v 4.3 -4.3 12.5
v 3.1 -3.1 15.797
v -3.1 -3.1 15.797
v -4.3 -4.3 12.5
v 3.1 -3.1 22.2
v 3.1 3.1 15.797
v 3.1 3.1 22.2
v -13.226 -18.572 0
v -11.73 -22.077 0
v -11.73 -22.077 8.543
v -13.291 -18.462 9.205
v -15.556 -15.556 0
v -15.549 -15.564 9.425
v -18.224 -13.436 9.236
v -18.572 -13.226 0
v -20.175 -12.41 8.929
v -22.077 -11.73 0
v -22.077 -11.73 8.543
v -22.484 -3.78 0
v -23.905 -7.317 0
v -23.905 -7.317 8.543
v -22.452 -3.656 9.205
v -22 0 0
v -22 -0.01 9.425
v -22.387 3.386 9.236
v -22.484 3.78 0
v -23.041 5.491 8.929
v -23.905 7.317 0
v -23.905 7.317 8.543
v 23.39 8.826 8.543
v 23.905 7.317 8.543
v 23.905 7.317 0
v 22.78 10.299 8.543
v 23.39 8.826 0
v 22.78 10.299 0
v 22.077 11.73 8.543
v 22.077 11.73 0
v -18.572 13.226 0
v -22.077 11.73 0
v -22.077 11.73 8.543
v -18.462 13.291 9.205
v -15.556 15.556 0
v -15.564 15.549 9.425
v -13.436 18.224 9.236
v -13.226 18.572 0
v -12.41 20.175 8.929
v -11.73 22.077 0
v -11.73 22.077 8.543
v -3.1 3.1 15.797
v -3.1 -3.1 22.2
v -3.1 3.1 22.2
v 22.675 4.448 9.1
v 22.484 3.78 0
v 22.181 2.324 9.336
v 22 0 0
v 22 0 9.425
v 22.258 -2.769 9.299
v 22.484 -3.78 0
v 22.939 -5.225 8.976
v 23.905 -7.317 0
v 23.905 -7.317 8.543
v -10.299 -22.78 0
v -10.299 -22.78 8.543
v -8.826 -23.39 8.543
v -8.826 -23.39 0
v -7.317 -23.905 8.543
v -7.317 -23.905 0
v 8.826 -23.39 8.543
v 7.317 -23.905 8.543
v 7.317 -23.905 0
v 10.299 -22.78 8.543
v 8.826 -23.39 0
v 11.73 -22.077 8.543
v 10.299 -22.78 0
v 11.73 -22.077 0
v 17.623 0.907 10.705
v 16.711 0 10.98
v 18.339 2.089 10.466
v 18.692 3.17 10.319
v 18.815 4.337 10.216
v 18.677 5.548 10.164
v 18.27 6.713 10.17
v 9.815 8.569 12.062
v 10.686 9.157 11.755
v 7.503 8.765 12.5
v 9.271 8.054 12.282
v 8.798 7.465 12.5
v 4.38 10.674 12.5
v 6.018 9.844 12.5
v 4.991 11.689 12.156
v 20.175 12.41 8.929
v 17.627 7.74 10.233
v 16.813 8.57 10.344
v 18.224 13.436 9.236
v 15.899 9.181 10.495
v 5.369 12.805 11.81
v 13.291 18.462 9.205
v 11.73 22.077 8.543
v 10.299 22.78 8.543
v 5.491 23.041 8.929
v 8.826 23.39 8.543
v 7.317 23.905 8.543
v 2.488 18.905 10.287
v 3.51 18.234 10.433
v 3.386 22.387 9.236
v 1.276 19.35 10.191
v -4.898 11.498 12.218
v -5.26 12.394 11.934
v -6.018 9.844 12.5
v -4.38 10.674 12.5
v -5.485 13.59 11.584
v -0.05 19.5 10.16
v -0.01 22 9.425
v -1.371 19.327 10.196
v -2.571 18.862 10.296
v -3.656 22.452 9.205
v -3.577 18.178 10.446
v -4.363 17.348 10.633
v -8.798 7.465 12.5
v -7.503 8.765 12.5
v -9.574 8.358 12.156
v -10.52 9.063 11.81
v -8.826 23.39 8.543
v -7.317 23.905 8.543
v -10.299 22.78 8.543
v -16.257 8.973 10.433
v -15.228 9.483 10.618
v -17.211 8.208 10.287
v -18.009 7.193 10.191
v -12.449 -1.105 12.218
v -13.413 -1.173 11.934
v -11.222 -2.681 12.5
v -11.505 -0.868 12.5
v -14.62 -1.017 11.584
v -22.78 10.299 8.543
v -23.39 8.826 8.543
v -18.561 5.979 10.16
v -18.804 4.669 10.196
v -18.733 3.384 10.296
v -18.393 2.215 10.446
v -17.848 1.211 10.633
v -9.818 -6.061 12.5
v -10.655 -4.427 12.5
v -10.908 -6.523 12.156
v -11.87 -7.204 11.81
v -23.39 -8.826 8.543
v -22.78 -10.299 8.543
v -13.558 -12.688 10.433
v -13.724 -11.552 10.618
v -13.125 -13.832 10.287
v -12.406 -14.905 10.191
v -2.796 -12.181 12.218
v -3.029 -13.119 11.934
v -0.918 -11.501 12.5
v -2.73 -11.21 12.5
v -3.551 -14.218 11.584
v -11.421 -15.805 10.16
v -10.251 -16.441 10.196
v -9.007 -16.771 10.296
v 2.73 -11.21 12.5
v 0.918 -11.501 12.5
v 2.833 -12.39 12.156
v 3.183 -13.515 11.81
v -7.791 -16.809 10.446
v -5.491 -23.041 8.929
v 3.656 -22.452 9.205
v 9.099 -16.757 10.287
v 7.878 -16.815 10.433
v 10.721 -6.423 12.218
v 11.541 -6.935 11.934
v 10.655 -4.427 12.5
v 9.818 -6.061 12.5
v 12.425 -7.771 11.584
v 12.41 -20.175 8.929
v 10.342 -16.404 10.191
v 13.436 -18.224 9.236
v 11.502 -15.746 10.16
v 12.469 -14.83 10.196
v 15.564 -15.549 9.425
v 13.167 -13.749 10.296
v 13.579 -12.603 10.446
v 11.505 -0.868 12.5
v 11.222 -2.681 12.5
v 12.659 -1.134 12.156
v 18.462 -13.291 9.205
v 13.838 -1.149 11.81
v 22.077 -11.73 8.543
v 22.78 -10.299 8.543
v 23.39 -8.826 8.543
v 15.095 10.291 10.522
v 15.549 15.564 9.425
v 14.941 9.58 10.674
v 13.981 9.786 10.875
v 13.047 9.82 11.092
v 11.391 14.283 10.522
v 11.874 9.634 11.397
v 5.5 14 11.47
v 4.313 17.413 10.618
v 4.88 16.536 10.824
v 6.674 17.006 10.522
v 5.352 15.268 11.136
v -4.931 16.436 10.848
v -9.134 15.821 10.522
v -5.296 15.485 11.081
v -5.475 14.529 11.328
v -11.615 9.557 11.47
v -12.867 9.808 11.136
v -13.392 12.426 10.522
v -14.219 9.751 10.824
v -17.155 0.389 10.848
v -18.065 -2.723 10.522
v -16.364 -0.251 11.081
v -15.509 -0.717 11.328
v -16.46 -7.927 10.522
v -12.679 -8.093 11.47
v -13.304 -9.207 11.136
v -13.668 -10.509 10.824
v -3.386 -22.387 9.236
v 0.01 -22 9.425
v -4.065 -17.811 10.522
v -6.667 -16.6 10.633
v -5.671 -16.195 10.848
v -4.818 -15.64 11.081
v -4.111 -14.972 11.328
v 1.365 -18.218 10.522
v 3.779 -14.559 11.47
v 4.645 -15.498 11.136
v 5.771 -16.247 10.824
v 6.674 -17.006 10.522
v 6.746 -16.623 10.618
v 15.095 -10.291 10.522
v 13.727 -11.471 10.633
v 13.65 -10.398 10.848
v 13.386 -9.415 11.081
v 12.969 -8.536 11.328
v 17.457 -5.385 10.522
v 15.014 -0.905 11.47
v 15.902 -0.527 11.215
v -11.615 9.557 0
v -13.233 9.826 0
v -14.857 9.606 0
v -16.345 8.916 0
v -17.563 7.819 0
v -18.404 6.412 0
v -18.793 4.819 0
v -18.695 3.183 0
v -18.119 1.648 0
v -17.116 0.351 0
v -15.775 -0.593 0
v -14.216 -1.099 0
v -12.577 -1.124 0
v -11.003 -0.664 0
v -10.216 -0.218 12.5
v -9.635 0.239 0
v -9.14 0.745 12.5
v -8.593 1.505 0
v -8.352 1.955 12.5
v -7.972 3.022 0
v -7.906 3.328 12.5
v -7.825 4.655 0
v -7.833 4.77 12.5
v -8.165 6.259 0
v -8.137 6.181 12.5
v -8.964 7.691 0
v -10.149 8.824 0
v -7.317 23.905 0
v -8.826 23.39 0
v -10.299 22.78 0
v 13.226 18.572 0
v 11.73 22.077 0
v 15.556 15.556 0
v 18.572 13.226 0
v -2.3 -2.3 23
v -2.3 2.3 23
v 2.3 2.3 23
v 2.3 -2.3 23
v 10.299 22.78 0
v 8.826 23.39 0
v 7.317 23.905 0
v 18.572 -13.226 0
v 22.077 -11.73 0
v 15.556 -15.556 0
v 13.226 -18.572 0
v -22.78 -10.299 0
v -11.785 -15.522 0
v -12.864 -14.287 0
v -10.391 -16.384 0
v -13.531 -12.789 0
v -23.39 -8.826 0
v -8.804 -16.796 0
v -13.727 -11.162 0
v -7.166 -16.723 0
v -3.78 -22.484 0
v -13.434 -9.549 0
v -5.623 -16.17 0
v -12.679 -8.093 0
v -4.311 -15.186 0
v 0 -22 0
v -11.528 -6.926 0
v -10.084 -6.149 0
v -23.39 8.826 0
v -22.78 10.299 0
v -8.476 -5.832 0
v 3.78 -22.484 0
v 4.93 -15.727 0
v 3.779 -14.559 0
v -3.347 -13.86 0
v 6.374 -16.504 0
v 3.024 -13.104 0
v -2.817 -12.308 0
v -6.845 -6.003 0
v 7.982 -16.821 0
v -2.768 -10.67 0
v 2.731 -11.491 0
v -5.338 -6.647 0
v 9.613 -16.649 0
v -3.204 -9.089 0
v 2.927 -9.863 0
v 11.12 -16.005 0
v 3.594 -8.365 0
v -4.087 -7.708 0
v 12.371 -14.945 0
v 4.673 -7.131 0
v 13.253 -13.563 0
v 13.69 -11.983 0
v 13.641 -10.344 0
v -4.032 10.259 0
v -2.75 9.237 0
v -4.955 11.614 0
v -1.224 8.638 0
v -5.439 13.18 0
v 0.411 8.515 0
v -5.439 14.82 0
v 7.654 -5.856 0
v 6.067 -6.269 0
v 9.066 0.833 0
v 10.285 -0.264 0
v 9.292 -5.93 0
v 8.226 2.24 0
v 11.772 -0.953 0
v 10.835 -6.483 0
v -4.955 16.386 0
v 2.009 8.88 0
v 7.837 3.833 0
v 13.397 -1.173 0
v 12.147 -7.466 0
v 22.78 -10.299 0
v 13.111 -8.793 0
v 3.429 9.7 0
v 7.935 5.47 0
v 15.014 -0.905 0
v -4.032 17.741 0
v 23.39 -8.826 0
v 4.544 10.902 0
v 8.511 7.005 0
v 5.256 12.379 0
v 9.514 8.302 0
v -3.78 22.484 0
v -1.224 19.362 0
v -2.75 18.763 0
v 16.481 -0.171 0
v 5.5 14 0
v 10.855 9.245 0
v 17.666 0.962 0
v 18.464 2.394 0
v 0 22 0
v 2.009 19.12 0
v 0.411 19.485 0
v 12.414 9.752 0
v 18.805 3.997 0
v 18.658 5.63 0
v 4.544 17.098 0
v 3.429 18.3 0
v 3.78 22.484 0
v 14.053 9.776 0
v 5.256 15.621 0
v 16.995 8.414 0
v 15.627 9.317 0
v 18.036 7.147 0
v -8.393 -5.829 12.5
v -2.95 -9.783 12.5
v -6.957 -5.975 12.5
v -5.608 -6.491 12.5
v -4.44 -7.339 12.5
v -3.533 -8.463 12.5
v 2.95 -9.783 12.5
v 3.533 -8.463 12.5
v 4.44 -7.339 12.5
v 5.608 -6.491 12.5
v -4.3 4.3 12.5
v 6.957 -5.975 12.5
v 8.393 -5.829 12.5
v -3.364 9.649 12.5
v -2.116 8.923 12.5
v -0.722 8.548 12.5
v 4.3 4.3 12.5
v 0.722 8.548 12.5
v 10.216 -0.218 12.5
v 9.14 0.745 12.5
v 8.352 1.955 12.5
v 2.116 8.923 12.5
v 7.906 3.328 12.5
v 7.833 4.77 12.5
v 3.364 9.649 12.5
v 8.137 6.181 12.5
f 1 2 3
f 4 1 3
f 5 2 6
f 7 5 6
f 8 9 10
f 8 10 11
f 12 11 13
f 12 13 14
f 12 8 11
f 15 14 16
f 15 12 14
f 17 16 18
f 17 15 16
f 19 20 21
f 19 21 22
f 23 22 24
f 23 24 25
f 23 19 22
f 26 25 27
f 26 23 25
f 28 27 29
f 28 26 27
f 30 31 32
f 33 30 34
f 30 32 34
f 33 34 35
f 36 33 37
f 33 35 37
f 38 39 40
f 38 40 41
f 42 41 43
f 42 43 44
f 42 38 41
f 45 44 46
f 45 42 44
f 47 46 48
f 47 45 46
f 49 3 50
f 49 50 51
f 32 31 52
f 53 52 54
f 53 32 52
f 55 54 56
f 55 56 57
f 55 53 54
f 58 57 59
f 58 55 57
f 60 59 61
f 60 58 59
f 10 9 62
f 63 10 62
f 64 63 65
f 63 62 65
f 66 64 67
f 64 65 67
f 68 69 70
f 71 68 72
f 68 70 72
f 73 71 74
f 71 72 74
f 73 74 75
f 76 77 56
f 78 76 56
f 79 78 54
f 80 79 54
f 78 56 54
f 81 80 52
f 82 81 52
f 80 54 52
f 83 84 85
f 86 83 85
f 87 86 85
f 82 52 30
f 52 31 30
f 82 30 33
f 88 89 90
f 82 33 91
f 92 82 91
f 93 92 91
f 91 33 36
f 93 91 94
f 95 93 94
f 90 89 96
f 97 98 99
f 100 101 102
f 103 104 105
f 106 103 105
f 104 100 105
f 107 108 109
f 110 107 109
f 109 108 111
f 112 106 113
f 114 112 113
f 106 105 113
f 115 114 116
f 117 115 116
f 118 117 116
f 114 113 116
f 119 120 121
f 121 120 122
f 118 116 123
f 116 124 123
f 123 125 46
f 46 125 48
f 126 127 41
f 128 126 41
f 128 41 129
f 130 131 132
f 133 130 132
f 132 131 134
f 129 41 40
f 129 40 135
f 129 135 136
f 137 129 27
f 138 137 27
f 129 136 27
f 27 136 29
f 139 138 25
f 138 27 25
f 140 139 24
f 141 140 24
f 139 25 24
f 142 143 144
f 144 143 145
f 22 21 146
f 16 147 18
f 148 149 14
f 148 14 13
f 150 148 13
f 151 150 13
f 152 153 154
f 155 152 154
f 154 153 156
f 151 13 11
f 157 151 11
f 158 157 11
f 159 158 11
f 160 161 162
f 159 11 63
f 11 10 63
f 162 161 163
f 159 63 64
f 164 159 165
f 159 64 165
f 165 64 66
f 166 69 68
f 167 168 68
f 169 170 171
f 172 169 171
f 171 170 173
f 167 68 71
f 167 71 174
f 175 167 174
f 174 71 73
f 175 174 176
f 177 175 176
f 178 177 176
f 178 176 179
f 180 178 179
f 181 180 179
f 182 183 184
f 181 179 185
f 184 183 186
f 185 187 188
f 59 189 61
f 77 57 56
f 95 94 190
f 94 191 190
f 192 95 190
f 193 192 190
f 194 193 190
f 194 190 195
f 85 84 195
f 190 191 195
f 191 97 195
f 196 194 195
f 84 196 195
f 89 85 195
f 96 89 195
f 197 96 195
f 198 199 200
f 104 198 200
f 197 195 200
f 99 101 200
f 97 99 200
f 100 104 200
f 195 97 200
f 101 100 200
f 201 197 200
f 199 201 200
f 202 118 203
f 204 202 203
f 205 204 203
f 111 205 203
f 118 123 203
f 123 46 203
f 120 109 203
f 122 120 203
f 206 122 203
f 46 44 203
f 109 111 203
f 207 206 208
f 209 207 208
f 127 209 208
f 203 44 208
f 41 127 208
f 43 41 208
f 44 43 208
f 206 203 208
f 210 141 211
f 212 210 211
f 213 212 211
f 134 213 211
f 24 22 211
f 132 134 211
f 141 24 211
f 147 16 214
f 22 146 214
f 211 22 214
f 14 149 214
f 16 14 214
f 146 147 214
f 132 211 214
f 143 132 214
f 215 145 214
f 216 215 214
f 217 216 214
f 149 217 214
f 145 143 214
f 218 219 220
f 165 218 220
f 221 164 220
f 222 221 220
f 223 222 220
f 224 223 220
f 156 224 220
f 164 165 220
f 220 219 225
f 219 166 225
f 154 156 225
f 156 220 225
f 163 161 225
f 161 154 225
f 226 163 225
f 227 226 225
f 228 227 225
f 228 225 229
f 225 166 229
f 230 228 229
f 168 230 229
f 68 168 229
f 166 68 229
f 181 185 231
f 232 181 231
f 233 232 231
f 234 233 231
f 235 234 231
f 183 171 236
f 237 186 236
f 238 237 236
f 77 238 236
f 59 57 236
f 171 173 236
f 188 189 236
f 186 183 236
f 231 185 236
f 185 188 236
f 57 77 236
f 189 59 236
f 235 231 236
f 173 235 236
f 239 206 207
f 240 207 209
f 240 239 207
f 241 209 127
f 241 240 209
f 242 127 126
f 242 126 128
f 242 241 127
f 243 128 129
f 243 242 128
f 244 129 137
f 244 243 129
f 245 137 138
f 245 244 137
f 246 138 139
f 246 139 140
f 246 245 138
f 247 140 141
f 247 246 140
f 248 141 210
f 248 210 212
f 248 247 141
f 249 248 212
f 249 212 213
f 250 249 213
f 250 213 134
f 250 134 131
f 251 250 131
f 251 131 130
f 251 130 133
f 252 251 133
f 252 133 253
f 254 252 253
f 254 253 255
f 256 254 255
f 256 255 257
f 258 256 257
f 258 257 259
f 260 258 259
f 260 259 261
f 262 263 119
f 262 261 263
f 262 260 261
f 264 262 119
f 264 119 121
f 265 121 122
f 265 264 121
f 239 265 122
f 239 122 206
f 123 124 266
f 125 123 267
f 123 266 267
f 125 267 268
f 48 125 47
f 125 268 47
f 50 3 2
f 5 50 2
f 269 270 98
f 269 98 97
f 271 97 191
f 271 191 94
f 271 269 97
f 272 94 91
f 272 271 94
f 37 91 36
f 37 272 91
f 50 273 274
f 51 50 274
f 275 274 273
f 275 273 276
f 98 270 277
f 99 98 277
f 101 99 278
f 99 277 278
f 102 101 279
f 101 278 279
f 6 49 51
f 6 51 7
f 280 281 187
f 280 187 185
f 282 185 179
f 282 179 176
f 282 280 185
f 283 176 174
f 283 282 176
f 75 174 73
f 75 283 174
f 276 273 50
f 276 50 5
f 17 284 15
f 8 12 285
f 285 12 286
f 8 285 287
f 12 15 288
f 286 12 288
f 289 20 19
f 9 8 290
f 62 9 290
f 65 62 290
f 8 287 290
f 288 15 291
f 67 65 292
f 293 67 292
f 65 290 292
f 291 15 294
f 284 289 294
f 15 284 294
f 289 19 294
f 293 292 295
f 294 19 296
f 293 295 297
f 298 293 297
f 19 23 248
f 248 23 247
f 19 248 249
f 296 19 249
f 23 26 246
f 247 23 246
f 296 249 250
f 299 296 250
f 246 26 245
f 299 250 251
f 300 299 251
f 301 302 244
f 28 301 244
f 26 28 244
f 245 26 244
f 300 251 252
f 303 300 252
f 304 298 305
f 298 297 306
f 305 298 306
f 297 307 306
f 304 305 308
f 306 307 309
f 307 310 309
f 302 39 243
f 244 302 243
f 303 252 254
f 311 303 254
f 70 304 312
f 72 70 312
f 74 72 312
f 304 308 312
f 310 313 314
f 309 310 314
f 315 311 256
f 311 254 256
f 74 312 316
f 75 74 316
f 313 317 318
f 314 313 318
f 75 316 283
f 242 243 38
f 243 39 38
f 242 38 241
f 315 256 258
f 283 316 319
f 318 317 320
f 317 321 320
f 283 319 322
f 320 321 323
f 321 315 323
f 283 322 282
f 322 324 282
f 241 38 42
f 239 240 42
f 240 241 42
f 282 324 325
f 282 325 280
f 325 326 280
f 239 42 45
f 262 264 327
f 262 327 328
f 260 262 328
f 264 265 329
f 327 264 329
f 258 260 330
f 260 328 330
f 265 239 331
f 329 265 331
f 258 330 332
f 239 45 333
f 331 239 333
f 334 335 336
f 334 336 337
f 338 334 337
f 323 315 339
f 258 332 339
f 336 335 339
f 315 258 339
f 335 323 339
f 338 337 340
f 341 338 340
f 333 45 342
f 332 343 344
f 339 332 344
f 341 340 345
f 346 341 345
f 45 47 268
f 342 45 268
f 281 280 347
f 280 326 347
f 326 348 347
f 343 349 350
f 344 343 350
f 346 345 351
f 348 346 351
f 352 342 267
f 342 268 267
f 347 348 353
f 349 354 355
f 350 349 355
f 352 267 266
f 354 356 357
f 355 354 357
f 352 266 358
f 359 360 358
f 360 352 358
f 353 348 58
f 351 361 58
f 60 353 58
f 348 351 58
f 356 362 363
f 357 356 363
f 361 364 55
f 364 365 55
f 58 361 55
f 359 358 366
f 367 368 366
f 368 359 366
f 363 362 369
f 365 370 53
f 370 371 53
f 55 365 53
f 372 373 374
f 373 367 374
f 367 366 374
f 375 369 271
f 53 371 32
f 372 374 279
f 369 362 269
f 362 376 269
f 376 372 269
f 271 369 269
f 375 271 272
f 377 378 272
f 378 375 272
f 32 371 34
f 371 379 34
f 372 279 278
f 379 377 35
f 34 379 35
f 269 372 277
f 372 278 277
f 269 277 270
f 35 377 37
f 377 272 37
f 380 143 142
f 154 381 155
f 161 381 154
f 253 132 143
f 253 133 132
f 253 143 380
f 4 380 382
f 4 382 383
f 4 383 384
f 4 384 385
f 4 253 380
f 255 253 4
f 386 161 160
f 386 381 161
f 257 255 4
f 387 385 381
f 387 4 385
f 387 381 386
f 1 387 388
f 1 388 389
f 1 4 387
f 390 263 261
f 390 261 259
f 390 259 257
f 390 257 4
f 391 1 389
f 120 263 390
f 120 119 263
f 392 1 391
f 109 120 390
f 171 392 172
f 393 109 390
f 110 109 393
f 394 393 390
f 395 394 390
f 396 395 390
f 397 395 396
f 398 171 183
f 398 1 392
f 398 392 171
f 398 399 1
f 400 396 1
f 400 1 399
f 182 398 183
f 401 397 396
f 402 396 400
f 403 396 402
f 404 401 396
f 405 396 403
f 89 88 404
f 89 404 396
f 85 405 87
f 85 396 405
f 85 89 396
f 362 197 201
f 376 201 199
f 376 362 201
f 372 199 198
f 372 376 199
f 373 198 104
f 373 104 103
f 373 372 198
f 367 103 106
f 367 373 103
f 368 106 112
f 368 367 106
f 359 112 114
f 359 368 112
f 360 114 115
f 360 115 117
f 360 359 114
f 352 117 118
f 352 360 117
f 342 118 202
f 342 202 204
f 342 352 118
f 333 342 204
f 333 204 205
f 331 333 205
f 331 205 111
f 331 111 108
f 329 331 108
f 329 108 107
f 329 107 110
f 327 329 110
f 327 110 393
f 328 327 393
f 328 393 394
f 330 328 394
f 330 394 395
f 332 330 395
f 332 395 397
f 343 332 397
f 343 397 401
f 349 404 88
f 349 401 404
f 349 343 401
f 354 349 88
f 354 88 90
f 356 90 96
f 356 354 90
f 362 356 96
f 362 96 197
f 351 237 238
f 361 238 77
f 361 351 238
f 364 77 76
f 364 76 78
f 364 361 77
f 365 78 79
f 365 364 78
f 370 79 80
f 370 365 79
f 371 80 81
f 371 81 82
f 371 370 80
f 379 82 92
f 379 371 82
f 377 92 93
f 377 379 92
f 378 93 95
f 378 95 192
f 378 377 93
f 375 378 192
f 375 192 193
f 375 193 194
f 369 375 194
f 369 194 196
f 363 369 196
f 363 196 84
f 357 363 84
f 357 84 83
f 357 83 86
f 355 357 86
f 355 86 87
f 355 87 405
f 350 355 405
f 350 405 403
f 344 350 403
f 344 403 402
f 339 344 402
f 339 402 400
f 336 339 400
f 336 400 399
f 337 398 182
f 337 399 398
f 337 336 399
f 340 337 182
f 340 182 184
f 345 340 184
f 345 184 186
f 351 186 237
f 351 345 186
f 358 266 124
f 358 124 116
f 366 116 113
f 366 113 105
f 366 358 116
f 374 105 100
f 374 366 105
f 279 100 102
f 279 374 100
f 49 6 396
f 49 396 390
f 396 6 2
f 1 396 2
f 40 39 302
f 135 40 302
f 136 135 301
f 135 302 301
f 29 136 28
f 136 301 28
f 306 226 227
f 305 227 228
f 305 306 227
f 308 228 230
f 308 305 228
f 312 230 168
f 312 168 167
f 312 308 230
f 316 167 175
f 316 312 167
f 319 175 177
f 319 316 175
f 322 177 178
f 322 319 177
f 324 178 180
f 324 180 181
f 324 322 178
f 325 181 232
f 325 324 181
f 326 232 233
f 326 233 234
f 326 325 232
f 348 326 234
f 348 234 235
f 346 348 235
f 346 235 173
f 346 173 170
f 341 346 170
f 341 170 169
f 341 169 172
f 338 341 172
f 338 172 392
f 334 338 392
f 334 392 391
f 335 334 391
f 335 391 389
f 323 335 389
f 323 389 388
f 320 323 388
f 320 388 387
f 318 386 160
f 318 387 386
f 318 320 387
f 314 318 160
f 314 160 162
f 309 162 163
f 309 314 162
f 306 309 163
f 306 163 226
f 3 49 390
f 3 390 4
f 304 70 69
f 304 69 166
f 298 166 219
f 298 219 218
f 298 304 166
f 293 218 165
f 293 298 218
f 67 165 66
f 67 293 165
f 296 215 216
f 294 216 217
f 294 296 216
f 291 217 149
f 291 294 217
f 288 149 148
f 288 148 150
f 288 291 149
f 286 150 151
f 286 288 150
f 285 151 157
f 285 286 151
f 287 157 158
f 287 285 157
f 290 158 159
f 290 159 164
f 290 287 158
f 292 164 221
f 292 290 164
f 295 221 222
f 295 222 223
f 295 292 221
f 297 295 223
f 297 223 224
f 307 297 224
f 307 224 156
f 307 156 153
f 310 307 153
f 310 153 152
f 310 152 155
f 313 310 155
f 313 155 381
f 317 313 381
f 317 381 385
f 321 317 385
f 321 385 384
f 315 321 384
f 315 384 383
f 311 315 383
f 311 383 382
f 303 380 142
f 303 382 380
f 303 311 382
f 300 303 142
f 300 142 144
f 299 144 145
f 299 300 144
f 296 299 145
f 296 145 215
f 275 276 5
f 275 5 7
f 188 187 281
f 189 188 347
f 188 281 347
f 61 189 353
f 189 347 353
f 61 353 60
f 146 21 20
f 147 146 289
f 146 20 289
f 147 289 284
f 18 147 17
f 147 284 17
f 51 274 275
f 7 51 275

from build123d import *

# Parameters (mm, degrees)
SKETCH_R              = 25
PAD_DEPTH             = 12.5
SKETCH001_W           = 6.2
SKETCH001_H           = 6.2
PAD001_DEPTH          = 23
CHAMFER_ANGLE         = 70
CHAMFER_SIZE          = 1.2
POCKET_DEPTH          = 171.715492
POLARPATTERN_COUNT    = 8
CHAMFER001_SIZE       = 0.8
SKETCH004_R           = 5.5
POCKET001_DEPTH       = 165.840033
POLARPATTERN001_COUNT = 5


with BuildPart() as part:
    # Sketch → Pad (new body)
    with BuildSketch(Plane.XY):
        Circle(SKETCH_R)
    extrude(amount=PAD_DEPTH)

    # Sketch001 → Pad001 (join)
    with BuildSketch(Plane.XY):
        Rectangle(SKETCH001_W, SKETCH001_H)
    extrude(amount=PAD001_DEPTH)

    # Chamfer
    chamfer_edges = [part.edges().sort_by_distance(p)[0] for p in [
        (0, -3.1, 12.5),
        (3.1, 0, 12.5),
        (0, 3.1, 12.5),
        (-3.1, 0, 12.5),
    ]]
    chamfer_side = part.faces().sort_by_distance((-24.292893, 0, 12.5))[0]
    chamfer(chamfer_edges, length=CHAMFER_SIZE, angle=CHAMFER_ANGLE, reference=chamfer_side)

    # Sketch002 → Pocket (cut, through all)
    with BuildSketch(Plane.XY):
        with BuildLine():
            ThreePointArc((-15, 37), (0, 22), (15, 37))
            Line((-15, 37), (15, 37))
        make_face()
    pocket = extrude(amount=POCKET_DEPTH, mode=Mode.SUBTRACT)

    # PolarPattern: Pocket ×8 about axis
    polarpattern_axis = Axis((0, 0, 0), (0, 0, 1))
    for i in range(1, POLARPATTERN_COUNT):
        add(pocket.rotate(polarpattern_axis, i * 360 / POLARPATTERN_COUNT), mode=Mode.SUBTRACT)

    # Sketch003 → Groove (revolve, cut)
    with BuildSketch(Plane.XZ):
        Polygon((7.66865, 25.207804), (7.66865, 13.637294), (28.54884, 7.5), (28.54884, 25.207804), align=None)
    revolve(axis=Axis((0, 0, 0), (0, 0, 1)), mode=Mode.SUBTRACT)

    # Chamfer001
    chamfer001_edges = [part.edges().sort_by_distance(p)[0] for p in [
        (0, 3.1, 23),
        (3.1, 0, 23),
        (0, -3.1, 23),
        (-3.1, 0, 23),
    ]]
    chamfer(chamfer001_edges, length=CHAMFER001_SIZE)

    # Sketch004 → Pocket001 (cut, through all)
    with BuildSketch(Plane.XY):
        with Locations((0, 14)):
            Circle(SKETCH004_R)
    pocket001 = extrude(amount=POCKET001_DEPTH, mode=Mode.SUBTRACT)

    # PolarPattern001: Pocket001 ×5 about axis
    polarpattern001_axis = Axis((0, 0, 0), (0, 0, 1))
    for i in range(1, POLARPATTERN001_COUNT):
        add(pocket001.rotate(polarpattern001_axis, i * 360 / POLARPATTERN001_COUNT), mode=Mode.SUBTRACT)


solid = part.part
